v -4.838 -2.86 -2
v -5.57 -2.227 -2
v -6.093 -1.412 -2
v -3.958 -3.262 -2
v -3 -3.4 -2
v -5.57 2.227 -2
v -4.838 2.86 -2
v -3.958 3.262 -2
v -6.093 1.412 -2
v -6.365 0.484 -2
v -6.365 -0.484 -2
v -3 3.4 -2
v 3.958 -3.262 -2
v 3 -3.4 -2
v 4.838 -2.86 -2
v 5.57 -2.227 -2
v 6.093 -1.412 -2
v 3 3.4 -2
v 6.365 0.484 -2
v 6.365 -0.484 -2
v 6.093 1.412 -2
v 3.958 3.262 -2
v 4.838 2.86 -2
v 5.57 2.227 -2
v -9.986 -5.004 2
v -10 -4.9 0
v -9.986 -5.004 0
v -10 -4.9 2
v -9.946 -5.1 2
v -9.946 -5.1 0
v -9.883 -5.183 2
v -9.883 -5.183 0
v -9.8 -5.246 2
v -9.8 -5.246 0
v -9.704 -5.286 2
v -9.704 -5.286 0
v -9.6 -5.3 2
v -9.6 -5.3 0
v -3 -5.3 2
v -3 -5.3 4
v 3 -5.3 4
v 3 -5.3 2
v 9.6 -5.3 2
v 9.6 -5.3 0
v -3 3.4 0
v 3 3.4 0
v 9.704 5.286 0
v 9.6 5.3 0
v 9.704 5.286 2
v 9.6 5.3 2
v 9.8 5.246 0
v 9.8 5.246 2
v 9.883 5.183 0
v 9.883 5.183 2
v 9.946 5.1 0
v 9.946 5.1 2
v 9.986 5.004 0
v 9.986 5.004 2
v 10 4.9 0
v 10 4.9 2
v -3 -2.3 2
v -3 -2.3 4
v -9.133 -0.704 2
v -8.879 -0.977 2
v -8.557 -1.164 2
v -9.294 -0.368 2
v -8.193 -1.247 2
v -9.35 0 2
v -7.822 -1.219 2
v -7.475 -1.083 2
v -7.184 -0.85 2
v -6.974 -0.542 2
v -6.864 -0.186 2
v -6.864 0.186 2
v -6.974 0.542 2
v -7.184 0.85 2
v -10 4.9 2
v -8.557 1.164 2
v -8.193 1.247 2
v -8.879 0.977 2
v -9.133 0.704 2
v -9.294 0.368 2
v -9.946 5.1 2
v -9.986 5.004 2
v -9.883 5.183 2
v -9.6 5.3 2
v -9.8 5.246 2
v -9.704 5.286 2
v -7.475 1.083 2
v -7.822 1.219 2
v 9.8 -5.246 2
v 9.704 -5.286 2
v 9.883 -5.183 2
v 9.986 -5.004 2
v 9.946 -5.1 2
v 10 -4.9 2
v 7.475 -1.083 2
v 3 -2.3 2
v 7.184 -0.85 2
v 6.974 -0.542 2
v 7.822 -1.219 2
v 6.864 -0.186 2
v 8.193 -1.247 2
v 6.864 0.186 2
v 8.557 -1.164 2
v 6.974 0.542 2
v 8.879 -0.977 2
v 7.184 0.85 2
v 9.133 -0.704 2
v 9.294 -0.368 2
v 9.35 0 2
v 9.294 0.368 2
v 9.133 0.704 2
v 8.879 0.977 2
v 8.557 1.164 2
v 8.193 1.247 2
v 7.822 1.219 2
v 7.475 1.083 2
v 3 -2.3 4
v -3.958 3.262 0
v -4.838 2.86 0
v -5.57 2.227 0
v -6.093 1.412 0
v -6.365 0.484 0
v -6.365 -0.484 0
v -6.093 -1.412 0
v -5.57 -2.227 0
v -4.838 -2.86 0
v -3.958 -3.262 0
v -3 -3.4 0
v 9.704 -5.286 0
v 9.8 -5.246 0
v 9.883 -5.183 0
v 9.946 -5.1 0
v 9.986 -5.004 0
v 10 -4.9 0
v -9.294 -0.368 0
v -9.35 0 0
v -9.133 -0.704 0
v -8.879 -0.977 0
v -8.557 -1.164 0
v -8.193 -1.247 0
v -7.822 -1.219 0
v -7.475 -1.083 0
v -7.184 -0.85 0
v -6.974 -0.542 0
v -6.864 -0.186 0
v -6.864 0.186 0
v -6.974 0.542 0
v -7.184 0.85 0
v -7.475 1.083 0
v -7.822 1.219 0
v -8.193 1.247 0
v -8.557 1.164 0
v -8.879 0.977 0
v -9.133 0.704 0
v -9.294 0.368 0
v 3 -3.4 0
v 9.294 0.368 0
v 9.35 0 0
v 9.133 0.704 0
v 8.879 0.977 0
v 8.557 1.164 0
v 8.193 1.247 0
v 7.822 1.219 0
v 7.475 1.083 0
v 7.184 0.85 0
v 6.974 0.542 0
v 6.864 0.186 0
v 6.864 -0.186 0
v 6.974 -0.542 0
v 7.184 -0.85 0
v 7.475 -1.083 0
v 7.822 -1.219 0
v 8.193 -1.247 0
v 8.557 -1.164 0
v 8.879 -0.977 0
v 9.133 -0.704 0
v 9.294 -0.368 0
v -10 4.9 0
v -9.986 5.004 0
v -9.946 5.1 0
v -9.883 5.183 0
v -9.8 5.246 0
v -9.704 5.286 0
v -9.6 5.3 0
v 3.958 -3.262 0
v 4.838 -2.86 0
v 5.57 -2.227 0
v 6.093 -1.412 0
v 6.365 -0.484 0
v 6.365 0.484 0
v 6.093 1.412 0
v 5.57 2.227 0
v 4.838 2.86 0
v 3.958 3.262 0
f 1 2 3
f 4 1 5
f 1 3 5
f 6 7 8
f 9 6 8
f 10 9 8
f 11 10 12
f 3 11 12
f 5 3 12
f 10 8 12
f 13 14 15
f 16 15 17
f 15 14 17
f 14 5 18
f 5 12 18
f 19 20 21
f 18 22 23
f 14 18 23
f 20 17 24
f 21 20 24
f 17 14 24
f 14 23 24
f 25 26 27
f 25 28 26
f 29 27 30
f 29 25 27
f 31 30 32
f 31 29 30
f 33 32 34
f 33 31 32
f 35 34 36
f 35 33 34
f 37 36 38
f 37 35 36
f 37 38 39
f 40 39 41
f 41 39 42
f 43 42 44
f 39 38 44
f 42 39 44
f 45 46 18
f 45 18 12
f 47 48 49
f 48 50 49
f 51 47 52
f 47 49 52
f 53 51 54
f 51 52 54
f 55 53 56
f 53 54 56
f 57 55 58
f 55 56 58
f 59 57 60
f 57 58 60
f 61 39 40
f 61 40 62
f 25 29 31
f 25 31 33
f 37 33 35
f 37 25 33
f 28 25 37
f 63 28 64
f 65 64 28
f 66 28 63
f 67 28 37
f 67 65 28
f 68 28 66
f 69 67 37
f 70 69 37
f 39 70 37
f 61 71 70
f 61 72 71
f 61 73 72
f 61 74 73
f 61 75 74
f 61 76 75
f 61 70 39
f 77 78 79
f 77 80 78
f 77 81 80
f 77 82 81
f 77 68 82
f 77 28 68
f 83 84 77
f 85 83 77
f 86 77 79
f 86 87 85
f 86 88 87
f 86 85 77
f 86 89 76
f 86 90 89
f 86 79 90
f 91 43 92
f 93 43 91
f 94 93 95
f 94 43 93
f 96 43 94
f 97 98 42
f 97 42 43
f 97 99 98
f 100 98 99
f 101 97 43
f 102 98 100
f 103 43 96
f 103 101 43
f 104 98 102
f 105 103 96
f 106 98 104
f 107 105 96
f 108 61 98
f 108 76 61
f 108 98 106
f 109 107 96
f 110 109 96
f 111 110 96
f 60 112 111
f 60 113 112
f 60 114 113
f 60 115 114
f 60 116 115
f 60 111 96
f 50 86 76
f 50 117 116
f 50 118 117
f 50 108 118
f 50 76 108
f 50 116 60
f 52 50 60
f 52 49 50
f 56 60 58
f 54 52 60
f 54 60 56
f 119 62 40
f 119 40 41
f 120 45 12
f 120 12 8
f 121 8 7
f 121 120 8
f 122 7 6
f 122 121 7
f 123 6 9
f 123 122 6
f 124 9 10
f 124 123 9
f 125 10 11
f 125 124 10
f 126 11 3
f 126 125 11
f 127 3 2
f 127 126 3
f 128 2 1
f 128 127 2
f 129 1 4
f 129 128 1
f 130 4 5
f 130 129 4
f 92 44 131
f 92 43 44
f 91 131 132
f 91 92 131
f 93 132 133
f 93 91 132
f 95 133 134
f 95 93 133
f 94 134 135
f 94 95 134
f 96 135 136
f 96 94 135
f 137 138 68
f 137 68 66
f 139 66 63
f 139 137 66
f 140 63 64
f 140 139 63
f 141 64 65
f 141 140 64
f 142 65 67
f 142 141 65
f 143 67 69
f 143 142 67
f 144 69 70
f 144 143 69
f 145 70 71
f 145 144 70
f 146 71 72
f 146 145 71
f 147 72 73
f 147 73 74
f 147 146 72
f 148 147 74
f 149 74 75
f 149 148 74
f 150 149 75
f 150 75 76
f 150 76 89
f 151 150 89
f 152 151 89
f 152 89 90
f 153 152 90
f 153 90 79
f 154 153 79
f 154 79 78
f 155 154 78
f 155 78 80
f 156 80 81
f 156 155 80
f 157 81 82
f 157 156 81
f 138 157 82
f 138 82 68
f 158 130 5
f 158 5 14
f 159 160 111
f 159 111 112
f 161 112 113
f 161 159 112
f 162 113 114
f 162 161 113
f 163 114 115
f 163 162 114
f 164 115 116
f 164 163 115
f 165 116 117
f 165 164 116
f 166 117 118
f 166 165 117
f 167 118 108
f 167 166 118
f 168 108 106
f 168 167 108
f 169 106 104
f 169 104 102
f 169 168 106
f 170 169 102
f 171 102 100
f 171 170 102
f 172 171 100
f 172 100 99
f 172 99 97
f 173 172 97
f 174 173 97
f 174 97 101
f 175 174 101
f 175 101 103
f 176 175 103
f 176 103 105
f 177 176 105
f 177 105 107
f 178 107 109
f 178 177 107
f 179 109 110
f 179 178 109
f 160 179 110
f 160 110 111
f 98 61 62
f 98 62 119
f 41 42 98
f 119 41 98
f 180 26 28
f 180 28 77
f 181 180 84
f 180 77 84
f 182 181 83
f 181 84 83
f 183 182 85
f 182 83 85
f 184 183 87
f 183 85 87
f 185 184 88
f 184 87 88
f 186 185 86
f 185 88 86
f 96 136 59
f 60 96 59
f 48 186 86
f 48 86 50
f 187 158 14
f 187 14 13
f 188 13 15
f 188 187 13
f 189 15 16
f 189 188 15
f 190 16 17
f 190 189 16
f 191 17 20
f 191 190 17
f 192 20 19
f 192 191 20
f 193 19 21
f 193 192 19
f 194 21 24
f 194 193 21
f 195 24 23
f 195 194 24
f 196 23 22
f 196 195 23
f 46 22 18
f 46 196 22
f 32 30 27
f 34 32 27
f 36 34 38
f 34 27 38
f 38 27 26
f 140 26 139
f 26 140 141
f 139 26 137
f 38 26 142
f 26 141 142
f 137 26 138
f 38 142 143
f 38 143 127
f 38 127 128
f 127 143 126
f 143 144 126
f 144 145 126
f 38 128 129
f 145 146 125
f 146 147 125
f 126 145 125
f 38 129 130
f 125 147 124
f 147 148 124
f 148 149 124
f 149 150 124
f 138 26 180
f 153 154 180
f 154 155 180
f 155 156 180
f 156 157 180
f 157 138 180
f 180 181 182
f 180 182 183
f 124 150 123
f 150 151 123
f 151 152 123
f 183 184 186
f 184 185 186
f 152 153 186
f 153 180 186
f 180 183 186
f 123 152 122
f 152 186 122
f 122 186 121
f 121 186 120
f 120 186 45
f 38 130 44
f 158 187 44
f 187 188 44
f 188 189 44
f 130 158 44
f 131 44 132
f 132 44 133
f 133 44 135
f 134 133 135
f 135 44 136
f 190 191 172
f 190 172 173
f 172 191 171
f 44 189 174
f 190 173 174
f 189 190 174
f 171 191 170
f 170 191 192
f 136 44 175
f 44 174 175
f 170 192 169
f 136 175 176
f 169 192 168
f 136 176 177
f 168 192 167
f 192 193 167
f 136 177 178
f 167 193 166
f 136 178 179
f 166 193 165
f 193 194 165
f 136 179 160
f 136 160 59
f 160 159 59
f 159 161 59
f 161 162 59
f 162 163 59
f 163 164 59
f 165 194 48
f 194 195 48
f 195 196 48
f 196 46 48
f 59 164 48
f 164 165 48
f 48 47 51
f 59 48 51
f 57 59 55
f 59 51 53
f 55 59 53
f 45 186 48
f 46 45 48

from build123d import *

# Parameters (mm, degrees)
SKETCH_1_W      = 20
SKETCH_1_H      = 10.6
SKETCH_1_R      = 1.25
EXTRUDE_1_DEPTH = 2
EXTRUDE_2_DEPTH = 2
SKETCH_3_W      = 6
SKETCH_3_H      = 3
EXTRUDE_3_DEPTH = 2
FILLET_1_R      = 0.4


with BuildPart() as part:
    # 草图1 → 凸台-拉伸1 (new body)
    with BuildSketch(Plane.XY):
        Rectangle(SKETCH_1_W, SKETCH_1_H)
        with Locations((8.1, 0)):
            Circle(SKETCH_1_R, mode=Mode.SUBTRACT)
        with Locations(Location((-8.1, 0, 0), (0, 0, 180))):
            Circle(SKETCH_1_R, mode=Mode.SUBTRACT)
    extrude(amount=EXTRUDE_1_DEPTH)

    # 草图2 → 凸台-拉伸2 (add)
    with BuildSketch(Plane(origin=(0, 0, 0), x_dir=(-1, 0, 0), z_dir=(0, 0, -1))):
        with BuildLine():
            Line((-3, 3.4), (3, 3.4))
            ThreePointArc((3, 3.4), (6.4, 0), (3, -3.4))
            Line((3, -3.4), (-3, -3.4))
            ThreePointArc((-3, -3.4), (-6.4, 0), (-3, 3.4))
        make_face()
    extrude(amount=EXTRUDE_2_DEPTH)

    # 草图3 → 凸台-拉伸3 (add)
    with BuildSketch(Plane.XY.offset(2)):
        with Locations((0, -3.8)):
            Rectangle(SKETCH_3_W, SKETCH_3_H)
    extrude(amount=EXTRUDE_3_DEPTH)

    # 圆角1
    fillet_1_edges = [part.edges().sort_by_distance(p)[0] for p in [
        (10, -5.3, 1),
        (-10, -5.3, 1),
        (-10, 5.3, 1),
        (10, 5.3, 1),
    ]]
    fillet(fillet_1_edges, radius=FILLET_1_R)


solid = part.part
